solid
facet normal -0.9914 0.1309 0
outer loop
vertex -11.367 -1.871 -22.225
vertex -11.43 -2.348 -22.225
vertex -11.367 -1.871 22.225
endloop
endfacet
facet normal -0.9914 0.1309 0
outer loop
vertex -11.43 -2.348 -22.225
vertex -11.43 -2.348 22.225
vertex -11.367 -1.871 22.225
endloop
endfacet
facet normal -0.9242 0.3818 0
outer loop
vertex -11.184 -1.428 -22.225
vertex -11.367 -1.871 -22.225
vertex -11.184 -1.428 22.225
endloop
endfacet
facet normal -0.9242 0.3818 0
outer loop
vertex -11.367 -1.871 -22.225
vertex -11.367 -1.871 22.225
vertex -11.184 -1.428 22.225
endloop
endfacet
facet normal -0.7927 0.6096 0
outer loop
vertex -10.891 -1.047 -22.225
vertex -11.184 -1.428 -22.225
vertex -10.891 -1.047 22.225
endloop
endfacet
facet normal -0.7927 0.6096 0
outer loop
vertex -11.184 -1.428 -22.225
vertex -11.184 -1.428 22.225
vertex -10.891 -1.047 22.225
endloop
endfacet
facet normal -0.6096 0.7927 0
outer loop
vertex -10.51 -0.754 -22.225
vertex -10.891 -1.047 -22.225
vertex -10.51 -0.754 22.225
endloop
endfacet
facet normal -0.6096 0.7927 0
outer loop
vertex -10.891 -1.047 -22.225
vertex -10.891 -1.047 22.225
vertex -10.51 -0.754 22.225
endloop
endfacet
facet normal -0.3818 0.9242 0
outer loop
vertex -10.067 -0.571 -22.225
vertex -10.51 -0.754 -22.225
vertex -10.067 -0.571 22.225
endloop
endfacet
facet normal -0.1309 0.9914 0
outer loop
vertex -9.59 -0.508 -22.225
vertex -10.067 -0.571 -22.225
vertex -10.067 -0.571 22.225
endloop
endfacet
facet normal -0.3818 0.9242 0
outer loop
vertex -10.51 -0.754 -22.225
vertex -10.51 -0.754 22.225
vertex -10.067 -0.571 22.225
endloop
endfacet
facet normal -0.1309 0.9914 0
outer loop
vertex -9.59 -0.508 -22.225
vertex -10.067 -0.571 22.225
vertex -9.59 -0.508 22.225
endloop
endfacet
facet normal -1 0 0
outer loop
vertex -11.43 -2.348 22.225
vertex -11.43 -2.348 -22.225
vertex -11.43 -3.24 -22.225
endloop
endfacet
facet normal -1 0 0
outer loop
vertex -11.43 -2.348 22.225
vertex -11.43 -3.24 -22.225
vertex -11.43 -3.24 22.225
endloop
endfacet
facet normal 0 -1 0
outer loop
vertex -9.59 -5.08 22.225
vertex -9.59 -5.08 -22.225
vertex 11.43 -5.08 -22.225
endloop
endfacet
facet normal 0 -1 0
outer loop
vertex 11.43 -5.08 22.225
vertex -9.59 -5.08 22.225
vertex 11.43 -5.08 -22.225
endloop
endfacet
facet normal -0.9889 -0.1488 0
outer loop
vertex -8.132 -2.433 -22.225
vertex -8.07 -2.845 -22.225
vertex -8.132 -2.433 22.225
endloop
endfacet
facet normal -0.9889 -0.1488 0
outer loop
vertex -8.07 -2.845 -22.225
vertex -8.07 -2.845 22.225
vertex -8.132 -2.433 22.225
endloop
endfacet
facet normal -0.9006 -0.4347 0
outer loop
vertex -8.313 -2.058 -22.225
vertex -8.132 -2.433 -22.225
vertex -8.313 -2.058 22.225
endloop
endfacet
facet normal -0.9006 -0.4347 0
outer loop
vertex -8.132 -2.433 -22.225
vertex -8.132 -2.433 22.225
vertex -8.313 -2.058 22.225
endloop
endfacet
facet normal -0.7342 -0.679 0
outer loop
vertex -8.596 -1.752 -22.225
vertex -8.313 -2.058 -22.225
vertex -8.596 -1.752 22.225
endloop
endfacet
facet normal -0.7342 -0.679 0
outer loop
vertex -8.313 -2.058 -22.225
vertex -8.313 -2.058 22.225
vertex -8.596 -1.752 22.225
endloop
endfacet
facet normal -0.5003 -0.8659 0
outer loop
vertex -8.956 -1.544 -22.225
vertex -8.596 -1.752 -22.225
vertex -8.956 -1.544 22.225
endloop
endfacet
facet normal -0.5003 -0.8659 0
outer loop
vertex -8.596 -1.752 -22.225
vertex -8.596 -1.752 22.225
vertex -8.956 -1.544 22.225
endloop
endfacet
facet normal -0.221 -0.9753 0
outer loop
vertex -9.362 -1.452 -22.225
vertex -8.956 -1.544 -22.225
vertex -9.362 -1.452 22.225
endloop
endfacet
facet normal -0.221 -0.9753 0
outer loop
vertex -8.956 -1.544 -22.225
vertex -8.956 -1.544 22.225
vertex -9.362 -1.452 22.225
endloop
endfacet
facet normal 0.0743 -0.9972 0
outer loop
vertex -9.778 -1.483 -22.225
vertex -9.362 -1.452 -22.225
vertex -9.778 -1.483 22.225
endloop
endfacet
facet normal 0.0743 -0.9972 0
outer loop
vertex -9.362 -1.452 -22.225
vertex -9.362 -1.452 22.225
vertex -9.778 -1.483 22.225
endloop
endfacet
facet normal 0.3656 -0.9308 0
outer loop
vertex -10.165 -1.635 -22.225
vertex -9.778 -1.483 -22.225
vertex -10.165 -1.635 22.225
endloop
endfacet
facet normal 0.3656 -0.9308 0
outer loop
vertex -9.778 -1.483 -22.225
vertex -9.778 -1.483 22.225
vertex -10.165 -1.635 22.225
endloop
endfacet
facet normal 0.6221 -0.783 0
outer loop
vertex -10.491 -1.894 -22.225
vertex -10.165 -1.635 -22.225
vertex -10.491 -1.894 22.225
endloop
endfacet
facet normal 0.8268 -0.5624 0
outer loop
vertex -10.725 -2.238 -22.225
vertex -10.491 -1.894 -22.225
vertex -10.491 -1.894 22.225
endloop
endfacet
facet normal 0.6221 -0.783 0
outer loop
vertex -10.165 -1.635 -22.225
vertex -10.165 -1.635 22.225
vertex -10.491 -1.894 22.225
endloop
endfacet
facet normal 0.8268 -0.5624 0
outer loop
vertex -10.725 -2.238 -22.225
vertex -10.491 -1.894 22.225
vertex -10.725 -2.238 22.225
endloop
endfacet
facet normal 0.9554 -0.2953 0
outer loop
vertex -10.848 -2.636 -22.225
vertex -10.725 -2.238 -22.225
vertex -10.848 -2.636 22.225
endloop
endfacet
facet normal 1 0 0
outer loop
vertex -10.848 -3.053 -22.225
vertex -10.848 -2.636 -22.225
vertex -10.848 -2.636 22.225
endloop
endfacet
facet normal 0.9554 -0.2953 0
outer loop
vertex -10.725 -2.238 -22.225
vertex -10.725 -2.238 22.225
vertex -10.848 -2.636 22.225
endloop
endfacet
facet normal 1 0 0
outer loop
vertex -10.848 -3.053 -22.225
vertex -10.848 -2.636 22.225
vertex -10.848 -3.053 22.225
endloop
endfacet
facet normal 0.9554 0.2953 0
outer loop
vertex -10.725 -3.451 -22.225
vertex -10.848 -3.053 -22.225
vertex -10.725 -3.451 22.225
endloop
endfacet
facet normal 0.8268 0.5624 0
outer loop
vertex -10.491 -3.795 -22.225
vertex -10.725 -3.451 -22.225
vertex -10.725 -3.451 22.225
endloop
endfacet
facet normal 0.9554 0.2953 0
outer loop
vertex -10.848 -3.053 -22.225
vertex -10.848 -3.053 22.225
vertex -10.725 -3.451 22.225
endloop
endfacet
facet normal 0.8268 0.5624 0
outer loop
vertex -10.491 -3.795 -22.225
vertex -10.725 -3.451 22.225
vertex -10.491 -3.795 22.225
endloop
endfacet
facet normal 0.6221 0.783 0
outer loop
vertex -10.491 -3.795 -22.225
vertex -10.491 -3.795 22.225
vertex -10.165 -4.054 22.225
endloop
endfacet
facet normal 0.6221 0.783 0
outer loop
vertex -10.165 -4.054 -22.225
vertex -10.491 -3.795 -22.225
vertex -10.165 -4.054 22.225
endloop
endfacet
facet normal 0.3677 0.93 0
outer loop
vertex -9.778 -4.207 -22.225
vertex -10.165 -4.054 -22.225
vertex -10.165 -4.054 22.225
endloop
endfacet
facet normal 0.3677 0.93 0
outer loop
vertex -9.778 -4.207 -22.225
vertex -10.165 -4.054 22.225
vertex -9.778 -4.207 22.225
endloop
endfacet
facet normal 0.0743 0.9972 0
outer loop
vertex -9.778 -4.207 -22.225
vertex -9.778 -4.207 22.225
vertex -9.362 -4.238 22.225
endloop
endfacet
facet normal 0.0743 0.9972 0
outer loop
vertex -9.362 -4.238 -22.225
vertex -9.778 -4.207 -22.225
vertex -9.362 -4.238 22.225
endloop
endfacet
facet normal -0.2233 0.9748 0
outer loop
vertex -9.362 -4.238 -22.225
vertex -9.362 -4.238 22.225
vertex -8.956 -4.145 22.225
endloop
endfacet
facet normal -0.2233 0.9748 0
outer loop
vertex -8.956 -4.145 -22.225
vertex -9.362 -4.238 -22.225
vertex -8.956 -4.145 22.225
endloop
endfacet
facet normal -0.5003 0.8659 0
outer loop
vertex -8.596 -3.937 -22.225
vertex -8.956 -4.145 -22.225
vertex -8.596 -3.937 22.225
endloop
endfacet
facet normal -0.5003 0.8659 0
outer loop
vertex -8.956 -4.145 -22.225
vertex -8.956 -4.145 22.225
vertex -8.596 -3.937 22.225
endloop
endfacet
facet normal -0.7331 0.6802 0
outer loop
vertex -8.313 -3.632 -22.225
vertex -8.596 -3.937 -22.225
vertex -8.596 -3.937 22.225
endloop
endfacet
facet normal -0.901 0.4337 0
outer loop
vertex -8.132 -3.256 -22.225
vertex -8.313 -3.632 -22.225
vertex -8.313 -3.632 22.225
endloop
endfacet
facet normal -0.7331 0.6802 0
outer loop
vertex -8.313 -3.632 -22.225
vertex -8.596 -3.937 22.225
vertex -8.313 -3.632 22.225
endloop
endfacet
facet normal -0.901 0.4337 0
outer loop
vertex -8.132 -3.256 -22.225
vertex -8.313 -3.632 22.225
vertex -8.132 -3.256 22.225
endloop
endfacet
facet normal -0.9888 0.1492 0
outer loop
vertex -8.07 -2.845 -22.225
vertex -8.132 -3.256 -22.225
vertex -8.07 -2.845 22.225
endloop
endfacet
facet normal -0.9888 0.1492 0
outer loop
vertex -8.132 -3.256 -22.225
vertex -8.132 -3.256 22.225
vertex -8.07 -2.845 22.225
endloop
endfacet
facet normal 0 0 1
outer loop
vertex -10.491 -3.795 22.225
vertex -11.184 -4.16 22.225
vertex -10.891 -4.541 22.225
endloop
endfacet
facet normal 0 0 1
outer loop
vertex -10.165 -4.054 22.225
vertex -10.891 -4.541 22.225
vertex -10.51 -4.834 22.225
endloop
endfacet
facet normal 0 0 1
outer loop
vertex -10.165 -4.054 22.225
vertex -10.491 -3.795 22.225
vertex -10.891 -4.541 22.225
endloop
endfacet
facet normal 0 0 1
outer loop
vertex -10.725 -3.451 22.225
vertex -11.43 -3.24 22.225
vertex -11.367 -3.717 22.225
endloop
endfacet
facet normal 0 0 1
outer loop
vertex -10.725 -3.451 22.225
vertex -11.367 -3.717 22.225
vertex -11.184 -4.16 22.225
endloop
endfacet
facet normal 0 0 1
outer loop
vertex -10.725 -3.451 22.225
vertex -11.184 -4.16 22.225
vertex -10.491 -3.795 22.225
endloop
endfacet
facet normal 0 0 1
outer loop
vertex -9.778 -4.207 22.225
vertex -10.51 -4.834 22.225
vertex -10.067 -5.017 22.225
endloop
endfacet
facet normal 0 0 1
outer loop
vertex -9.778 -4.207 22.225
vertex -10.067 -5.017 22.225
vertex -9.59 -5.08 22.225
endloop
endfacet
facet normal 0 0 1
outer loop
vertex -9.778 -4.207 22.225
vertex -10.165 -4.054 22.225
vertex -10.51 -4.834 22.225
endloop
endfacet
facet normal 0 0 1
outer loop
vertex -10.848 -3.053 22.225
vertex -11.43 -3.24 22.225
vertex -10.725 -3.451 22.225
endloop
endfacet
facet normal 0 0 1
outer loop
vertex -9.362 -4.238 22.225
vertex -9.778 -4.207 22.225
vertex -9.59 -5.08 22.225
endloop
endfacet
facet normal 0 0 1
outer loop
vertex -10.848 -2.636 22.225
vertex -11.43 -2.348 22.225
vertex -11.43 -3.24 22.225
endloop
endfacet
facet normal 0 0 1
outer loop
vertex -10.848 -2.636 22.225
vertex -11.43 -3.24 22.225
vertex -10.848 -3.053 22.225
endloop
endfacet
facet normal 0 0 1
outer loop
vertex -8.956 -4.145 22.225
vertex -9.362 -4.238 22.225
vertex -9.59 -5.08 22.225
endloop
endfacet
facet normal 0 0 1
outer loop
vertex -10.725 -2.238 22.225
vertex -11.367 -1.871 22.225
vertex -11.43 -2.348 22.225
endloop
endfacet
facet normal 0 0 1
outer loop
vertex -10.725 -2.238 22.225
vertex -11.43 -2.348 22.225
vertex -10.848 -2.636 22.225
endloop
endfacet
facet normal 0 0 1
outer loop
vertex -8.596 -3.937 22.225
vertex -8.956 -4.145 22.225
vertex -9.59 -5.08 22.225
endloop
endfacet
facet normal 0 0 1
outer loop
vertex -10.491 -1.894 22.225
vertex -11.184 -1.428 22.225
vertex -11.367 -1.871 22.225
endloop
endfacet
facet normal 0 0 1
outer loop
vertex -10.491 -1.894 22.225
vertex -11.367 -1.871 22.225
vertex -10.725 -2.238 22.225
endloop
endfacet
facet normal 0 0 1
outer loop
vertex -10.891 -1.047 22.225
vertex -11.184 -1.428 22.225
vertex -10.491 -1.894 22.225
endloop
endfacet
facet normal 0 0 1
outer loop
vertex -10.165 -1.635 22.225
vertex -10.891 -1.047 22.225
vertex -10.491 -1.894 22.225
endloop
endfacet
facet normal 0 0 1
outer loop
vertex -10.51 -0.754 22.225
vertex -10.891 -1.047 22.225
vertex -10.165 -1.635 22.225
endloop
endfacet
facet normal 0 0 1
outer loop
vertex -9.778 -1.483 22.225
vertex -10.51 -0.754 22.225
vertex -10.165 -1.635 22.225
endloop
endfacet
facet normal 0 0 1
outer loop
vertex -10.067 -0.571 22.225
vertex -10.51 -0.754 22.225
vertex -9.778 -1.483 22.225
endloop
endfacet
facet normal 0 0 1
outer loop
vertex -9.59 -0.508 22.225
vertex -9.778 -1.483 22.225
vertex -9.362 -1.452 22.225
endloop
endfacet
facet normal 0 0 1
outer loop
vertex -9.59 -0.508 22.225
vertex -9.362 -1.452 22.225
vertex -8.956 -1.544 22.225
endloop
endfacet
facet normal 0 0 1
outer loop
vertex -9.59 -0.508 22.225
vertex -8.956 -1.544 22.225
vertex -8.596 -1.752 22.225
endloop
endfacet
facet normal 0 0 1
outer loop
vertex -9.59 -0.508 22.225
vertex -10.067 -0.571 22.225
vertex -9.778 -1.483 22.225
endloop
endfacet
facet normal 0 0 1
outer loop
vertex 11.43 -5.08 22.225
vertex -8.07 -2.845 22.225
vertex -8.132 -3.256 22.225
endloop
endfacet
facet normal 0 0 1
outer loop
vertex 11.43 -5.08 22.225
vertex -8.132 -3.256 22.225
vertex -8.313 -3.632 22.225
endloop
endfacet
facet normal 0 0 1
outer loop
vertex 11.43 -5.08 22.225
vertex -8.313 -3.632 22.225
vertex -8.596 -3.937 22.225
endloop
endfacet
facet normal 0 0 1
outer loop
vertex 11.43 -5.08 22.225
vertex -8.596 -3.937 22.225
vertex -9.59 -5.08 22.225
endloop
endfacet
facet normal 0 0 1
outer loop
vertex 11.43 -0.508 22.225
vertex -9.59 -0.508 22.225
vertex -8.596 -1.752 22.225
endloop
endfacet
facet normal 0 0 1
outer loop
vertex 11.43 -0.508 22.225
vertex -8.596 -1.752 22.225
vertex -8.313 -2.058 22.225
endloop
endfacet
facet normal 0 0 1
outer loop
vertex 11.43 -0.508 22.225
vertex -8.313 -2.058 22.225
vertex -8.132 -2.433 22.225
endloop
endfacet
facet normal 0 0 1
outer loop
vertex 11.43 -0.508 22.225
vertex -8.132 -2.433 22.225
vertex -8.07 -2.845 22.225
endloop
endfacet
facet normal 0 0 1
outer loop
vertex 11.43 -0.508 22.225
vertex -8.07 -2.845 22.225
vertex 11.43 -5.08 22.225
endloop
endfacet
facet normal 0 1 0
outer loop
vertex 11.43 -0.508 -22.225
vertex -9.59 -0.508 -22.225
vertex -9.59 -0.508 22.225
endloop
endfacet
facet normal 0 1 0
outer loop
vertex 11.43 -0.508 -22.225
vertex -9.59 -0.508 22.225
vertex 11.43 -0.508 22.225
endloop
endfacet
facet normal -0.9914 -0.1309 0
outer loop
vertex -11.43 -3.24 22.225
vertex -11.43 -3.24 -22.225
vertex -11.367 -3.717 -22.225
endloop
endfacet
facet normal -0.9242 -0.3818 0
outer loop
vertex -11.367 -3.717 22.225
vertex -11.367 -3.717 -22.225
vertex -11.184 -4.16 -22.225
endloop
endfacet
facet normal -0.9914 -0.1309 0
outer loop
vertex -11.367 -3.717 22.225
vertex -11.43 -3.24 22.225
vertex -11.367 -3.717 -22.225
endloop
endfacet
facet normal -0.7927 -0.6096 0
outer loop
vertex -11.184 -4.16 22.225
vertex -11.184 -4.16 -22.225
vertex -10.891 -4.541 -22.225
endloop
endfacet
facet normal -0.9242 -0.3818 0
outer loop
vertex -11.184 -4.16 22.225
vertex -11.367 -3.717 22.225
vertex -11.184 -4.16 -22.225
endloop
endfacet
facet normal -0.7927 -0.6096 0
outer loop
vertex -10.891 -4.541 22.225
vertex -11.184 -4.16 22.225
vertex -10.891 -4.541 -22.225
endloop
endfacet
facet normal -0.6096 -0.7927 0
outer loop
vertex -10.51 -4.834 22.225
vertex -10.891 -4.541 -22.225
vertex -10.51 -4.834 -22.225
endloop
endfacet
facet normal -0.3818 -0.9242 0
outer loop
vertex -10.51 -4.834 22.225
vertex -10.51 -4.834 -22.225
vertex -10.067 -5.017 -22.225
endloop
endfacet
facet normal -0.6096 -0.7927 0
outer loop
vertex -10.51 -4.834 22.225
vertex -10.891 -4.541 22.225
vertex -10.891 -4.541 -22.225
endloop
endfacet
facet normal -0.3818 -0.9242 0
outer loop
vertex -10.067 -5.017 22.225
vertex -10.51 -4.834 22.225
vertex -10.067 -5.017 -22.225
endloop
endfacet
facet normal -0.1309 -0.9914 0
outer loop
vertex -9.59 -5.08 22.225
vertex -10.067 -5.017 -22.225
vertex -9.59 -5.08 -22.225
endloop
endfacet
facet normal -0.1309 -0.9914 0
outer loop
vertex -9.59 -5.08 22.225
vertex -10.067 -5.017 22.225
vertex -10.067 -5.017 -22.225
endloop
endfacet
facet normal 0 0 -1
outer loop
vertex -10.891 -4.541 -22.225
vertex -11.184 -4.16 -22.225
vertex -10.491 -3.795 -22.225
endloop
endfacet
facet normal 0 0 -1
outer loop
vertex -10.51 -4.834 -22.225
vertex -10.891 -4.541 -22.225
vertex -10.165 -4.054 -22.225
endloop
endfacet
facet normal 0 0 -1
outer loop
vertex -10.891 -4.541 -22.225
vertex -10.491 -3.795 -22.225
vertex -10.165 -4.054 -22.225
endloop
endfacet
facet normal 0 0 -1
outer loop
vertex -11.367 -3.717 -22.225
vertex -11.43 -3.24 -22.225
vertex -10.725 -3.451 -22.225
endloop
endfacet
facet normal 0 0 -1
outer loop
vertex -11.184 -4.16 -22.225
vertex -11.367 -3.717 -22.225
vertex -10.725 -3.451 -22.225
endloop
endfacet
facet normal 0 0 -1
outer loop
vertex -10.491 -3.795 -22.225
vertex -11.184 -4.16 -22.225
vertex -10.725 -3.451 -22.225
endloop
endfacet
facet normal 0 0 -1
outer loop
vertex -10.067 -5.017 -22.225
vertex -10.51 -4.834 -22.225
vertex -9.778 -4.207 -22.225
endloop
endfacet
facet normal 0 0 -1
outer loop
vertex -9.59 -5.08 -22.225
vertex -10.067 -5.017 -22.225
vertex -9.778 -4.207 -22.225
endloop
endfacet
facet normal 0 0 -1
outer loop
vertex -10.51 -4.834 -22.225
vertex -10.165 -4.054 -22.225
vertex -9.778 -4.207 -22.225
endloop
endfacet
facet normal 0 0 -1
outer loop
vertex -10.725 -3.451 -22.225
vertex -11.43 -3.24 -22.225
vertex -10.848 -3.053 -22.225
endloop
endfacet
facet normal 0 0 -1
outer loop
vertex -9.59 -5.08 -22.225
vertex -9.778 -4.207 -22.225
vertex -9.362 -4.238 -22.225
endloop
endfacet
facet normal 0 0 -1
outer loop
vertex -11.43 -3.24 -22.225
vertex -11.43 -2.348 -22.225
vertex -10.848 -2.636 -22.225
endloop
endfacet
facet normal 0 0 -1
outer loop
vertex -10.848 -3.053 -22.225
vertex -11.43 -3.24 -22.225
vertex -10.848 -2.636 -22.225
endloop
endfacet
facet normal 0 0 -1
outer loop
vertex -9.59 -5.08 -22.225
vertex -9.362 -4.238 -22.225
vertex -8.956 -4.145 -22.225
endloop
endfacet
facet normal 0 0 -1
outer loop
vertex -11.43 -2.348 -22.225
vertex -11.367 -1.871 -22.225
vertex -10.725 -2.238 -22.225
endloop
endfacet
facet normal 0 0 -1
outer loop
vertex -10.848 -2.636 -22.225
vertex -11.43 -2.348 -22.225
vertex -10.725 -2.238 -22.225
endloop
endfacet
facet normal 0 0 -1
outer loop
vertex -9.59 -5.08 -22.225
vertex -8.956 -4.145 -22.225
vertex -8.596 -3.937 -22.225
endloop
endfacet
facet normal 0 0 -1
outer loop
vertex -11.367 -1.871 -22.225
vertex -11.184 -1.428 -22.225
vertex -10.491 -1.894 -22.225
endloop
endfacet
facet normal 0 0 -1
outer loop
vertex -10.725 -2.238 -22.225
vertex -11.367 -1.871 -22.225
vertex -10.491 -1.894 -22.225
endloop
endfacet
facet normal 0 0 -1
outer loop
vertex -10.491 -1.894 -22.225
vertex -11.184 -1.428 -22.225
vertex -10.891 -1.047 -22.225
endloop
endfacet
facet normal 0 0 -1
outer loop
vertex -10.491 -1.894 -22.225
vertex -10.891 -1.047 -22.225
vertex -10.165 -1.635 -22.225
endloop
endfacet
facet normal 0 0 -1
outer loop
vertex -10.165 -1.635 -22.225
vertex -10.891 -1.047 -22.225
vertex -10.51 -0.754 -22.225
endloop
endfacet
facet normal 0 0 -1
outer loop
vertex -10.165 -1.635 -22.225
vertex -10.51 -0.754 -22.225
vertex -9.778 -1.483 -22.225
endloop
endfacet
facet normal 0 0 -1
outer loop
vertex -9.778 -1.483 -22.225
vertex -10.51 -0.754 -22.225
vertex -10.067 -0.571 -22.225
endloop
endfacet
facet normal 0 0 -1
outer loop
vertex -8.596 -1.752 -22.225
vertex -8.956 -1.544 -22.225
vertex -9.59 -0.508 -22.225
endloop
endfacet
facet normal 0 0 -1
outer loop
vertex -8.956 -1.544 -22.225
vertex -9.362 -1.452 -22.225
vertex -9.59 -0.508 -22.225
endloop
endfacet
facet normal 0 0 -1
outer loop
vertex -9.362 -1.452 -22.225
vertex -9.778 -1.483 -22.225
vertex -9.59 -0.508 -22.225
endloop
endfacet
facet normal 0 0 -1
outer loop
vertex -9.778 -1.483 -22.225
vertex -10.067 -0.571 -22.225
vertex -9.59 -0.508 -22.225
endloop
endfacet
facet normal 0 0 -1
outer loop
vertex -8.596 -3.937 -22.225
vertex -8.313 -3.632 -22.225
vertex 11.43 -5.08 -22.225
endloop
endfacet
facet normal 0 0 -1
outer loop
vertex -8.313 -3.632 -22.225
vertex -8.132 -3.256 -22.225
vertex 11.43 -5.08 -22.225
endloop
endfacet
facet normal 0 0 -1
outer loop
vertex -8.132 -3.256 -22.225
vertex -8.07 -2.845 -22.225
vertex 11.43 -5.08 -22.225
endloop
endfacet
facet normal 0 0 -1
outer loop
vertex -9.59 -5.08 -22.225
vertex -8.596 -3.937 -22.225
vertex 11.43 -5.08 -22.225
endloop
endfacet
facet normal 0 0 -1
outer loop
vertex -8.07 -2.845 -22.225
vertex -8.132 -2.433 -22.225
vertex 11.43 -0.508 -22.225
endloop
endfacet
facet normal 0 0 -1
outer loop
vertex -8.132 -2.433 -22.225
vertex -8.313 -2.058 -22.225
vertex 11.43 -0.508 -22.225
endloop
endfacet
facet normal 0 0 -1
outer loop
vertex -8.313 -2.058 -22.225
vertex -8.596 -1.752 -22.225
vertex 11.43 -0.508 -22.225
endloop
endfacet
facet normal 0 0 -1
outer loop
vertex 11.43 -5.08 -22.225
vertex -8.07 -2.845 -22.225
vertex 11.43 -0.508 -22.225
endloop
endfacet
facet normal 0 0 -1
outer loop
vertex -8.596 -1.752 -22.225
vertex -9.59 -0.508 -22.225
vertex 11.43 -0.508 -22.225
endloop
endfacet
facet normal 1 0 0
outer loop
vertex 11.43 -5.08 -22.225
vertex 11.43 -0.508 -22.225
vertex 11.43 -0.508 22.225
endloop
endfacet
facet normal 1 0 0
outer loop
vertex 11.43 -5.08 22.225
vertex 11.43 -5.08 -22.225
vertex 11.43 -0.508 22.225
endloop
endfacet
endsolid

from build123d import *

# Parameters (mm, degrees)
F1_START      = 0.508
F0_W          = 22.86
F0_H          = 44.45
F1_DEPTH      = 4.572
F2_R          = 1.397
F3_DEPTH      = 25.4
F3_DEPTH_BACK = 25.4
F4_R          = 1.8396307345
F5_R          = 1.8396307345


with BuildPart() as f1:
    # F0 (on Front) → F1 (new body)
    with BuildSketch(Plane.XZ.offset(F1_START)):
        Rectangle(F0_W, F0_H)
    extrude(amount=F1_DEPTH)

    # F2 (on Top) → F3 (cut, two sides)
    with BuildSketch(Plane.XY) as f3_sk:
        with Locations((-9.4667607918, -2.8446267825)):
            Circle(F2_R)
    extrude(amount=F3_DEPTH, mode=Mode.SUBTRACT)
    extrude(f3_sk.sketch, amount=-F3_DEPTH_BACK, mode=Mode.SUBTRACT)

    # F4
    f4_edges = [f1.edges().sort_by_distance(p)[0] for p in [
        (-11.43, -0.508, 0),
    ]]
    fillet(f4_edges, radius=F4_R)

    # F5
    f5_edges = [f1.edges().sort_by_distance(p)[0] for p in [
        (-11.43, -5.08, 0),
    ]]
    fillet(f5_edges, radius=F5_R)


solid = f1.part
